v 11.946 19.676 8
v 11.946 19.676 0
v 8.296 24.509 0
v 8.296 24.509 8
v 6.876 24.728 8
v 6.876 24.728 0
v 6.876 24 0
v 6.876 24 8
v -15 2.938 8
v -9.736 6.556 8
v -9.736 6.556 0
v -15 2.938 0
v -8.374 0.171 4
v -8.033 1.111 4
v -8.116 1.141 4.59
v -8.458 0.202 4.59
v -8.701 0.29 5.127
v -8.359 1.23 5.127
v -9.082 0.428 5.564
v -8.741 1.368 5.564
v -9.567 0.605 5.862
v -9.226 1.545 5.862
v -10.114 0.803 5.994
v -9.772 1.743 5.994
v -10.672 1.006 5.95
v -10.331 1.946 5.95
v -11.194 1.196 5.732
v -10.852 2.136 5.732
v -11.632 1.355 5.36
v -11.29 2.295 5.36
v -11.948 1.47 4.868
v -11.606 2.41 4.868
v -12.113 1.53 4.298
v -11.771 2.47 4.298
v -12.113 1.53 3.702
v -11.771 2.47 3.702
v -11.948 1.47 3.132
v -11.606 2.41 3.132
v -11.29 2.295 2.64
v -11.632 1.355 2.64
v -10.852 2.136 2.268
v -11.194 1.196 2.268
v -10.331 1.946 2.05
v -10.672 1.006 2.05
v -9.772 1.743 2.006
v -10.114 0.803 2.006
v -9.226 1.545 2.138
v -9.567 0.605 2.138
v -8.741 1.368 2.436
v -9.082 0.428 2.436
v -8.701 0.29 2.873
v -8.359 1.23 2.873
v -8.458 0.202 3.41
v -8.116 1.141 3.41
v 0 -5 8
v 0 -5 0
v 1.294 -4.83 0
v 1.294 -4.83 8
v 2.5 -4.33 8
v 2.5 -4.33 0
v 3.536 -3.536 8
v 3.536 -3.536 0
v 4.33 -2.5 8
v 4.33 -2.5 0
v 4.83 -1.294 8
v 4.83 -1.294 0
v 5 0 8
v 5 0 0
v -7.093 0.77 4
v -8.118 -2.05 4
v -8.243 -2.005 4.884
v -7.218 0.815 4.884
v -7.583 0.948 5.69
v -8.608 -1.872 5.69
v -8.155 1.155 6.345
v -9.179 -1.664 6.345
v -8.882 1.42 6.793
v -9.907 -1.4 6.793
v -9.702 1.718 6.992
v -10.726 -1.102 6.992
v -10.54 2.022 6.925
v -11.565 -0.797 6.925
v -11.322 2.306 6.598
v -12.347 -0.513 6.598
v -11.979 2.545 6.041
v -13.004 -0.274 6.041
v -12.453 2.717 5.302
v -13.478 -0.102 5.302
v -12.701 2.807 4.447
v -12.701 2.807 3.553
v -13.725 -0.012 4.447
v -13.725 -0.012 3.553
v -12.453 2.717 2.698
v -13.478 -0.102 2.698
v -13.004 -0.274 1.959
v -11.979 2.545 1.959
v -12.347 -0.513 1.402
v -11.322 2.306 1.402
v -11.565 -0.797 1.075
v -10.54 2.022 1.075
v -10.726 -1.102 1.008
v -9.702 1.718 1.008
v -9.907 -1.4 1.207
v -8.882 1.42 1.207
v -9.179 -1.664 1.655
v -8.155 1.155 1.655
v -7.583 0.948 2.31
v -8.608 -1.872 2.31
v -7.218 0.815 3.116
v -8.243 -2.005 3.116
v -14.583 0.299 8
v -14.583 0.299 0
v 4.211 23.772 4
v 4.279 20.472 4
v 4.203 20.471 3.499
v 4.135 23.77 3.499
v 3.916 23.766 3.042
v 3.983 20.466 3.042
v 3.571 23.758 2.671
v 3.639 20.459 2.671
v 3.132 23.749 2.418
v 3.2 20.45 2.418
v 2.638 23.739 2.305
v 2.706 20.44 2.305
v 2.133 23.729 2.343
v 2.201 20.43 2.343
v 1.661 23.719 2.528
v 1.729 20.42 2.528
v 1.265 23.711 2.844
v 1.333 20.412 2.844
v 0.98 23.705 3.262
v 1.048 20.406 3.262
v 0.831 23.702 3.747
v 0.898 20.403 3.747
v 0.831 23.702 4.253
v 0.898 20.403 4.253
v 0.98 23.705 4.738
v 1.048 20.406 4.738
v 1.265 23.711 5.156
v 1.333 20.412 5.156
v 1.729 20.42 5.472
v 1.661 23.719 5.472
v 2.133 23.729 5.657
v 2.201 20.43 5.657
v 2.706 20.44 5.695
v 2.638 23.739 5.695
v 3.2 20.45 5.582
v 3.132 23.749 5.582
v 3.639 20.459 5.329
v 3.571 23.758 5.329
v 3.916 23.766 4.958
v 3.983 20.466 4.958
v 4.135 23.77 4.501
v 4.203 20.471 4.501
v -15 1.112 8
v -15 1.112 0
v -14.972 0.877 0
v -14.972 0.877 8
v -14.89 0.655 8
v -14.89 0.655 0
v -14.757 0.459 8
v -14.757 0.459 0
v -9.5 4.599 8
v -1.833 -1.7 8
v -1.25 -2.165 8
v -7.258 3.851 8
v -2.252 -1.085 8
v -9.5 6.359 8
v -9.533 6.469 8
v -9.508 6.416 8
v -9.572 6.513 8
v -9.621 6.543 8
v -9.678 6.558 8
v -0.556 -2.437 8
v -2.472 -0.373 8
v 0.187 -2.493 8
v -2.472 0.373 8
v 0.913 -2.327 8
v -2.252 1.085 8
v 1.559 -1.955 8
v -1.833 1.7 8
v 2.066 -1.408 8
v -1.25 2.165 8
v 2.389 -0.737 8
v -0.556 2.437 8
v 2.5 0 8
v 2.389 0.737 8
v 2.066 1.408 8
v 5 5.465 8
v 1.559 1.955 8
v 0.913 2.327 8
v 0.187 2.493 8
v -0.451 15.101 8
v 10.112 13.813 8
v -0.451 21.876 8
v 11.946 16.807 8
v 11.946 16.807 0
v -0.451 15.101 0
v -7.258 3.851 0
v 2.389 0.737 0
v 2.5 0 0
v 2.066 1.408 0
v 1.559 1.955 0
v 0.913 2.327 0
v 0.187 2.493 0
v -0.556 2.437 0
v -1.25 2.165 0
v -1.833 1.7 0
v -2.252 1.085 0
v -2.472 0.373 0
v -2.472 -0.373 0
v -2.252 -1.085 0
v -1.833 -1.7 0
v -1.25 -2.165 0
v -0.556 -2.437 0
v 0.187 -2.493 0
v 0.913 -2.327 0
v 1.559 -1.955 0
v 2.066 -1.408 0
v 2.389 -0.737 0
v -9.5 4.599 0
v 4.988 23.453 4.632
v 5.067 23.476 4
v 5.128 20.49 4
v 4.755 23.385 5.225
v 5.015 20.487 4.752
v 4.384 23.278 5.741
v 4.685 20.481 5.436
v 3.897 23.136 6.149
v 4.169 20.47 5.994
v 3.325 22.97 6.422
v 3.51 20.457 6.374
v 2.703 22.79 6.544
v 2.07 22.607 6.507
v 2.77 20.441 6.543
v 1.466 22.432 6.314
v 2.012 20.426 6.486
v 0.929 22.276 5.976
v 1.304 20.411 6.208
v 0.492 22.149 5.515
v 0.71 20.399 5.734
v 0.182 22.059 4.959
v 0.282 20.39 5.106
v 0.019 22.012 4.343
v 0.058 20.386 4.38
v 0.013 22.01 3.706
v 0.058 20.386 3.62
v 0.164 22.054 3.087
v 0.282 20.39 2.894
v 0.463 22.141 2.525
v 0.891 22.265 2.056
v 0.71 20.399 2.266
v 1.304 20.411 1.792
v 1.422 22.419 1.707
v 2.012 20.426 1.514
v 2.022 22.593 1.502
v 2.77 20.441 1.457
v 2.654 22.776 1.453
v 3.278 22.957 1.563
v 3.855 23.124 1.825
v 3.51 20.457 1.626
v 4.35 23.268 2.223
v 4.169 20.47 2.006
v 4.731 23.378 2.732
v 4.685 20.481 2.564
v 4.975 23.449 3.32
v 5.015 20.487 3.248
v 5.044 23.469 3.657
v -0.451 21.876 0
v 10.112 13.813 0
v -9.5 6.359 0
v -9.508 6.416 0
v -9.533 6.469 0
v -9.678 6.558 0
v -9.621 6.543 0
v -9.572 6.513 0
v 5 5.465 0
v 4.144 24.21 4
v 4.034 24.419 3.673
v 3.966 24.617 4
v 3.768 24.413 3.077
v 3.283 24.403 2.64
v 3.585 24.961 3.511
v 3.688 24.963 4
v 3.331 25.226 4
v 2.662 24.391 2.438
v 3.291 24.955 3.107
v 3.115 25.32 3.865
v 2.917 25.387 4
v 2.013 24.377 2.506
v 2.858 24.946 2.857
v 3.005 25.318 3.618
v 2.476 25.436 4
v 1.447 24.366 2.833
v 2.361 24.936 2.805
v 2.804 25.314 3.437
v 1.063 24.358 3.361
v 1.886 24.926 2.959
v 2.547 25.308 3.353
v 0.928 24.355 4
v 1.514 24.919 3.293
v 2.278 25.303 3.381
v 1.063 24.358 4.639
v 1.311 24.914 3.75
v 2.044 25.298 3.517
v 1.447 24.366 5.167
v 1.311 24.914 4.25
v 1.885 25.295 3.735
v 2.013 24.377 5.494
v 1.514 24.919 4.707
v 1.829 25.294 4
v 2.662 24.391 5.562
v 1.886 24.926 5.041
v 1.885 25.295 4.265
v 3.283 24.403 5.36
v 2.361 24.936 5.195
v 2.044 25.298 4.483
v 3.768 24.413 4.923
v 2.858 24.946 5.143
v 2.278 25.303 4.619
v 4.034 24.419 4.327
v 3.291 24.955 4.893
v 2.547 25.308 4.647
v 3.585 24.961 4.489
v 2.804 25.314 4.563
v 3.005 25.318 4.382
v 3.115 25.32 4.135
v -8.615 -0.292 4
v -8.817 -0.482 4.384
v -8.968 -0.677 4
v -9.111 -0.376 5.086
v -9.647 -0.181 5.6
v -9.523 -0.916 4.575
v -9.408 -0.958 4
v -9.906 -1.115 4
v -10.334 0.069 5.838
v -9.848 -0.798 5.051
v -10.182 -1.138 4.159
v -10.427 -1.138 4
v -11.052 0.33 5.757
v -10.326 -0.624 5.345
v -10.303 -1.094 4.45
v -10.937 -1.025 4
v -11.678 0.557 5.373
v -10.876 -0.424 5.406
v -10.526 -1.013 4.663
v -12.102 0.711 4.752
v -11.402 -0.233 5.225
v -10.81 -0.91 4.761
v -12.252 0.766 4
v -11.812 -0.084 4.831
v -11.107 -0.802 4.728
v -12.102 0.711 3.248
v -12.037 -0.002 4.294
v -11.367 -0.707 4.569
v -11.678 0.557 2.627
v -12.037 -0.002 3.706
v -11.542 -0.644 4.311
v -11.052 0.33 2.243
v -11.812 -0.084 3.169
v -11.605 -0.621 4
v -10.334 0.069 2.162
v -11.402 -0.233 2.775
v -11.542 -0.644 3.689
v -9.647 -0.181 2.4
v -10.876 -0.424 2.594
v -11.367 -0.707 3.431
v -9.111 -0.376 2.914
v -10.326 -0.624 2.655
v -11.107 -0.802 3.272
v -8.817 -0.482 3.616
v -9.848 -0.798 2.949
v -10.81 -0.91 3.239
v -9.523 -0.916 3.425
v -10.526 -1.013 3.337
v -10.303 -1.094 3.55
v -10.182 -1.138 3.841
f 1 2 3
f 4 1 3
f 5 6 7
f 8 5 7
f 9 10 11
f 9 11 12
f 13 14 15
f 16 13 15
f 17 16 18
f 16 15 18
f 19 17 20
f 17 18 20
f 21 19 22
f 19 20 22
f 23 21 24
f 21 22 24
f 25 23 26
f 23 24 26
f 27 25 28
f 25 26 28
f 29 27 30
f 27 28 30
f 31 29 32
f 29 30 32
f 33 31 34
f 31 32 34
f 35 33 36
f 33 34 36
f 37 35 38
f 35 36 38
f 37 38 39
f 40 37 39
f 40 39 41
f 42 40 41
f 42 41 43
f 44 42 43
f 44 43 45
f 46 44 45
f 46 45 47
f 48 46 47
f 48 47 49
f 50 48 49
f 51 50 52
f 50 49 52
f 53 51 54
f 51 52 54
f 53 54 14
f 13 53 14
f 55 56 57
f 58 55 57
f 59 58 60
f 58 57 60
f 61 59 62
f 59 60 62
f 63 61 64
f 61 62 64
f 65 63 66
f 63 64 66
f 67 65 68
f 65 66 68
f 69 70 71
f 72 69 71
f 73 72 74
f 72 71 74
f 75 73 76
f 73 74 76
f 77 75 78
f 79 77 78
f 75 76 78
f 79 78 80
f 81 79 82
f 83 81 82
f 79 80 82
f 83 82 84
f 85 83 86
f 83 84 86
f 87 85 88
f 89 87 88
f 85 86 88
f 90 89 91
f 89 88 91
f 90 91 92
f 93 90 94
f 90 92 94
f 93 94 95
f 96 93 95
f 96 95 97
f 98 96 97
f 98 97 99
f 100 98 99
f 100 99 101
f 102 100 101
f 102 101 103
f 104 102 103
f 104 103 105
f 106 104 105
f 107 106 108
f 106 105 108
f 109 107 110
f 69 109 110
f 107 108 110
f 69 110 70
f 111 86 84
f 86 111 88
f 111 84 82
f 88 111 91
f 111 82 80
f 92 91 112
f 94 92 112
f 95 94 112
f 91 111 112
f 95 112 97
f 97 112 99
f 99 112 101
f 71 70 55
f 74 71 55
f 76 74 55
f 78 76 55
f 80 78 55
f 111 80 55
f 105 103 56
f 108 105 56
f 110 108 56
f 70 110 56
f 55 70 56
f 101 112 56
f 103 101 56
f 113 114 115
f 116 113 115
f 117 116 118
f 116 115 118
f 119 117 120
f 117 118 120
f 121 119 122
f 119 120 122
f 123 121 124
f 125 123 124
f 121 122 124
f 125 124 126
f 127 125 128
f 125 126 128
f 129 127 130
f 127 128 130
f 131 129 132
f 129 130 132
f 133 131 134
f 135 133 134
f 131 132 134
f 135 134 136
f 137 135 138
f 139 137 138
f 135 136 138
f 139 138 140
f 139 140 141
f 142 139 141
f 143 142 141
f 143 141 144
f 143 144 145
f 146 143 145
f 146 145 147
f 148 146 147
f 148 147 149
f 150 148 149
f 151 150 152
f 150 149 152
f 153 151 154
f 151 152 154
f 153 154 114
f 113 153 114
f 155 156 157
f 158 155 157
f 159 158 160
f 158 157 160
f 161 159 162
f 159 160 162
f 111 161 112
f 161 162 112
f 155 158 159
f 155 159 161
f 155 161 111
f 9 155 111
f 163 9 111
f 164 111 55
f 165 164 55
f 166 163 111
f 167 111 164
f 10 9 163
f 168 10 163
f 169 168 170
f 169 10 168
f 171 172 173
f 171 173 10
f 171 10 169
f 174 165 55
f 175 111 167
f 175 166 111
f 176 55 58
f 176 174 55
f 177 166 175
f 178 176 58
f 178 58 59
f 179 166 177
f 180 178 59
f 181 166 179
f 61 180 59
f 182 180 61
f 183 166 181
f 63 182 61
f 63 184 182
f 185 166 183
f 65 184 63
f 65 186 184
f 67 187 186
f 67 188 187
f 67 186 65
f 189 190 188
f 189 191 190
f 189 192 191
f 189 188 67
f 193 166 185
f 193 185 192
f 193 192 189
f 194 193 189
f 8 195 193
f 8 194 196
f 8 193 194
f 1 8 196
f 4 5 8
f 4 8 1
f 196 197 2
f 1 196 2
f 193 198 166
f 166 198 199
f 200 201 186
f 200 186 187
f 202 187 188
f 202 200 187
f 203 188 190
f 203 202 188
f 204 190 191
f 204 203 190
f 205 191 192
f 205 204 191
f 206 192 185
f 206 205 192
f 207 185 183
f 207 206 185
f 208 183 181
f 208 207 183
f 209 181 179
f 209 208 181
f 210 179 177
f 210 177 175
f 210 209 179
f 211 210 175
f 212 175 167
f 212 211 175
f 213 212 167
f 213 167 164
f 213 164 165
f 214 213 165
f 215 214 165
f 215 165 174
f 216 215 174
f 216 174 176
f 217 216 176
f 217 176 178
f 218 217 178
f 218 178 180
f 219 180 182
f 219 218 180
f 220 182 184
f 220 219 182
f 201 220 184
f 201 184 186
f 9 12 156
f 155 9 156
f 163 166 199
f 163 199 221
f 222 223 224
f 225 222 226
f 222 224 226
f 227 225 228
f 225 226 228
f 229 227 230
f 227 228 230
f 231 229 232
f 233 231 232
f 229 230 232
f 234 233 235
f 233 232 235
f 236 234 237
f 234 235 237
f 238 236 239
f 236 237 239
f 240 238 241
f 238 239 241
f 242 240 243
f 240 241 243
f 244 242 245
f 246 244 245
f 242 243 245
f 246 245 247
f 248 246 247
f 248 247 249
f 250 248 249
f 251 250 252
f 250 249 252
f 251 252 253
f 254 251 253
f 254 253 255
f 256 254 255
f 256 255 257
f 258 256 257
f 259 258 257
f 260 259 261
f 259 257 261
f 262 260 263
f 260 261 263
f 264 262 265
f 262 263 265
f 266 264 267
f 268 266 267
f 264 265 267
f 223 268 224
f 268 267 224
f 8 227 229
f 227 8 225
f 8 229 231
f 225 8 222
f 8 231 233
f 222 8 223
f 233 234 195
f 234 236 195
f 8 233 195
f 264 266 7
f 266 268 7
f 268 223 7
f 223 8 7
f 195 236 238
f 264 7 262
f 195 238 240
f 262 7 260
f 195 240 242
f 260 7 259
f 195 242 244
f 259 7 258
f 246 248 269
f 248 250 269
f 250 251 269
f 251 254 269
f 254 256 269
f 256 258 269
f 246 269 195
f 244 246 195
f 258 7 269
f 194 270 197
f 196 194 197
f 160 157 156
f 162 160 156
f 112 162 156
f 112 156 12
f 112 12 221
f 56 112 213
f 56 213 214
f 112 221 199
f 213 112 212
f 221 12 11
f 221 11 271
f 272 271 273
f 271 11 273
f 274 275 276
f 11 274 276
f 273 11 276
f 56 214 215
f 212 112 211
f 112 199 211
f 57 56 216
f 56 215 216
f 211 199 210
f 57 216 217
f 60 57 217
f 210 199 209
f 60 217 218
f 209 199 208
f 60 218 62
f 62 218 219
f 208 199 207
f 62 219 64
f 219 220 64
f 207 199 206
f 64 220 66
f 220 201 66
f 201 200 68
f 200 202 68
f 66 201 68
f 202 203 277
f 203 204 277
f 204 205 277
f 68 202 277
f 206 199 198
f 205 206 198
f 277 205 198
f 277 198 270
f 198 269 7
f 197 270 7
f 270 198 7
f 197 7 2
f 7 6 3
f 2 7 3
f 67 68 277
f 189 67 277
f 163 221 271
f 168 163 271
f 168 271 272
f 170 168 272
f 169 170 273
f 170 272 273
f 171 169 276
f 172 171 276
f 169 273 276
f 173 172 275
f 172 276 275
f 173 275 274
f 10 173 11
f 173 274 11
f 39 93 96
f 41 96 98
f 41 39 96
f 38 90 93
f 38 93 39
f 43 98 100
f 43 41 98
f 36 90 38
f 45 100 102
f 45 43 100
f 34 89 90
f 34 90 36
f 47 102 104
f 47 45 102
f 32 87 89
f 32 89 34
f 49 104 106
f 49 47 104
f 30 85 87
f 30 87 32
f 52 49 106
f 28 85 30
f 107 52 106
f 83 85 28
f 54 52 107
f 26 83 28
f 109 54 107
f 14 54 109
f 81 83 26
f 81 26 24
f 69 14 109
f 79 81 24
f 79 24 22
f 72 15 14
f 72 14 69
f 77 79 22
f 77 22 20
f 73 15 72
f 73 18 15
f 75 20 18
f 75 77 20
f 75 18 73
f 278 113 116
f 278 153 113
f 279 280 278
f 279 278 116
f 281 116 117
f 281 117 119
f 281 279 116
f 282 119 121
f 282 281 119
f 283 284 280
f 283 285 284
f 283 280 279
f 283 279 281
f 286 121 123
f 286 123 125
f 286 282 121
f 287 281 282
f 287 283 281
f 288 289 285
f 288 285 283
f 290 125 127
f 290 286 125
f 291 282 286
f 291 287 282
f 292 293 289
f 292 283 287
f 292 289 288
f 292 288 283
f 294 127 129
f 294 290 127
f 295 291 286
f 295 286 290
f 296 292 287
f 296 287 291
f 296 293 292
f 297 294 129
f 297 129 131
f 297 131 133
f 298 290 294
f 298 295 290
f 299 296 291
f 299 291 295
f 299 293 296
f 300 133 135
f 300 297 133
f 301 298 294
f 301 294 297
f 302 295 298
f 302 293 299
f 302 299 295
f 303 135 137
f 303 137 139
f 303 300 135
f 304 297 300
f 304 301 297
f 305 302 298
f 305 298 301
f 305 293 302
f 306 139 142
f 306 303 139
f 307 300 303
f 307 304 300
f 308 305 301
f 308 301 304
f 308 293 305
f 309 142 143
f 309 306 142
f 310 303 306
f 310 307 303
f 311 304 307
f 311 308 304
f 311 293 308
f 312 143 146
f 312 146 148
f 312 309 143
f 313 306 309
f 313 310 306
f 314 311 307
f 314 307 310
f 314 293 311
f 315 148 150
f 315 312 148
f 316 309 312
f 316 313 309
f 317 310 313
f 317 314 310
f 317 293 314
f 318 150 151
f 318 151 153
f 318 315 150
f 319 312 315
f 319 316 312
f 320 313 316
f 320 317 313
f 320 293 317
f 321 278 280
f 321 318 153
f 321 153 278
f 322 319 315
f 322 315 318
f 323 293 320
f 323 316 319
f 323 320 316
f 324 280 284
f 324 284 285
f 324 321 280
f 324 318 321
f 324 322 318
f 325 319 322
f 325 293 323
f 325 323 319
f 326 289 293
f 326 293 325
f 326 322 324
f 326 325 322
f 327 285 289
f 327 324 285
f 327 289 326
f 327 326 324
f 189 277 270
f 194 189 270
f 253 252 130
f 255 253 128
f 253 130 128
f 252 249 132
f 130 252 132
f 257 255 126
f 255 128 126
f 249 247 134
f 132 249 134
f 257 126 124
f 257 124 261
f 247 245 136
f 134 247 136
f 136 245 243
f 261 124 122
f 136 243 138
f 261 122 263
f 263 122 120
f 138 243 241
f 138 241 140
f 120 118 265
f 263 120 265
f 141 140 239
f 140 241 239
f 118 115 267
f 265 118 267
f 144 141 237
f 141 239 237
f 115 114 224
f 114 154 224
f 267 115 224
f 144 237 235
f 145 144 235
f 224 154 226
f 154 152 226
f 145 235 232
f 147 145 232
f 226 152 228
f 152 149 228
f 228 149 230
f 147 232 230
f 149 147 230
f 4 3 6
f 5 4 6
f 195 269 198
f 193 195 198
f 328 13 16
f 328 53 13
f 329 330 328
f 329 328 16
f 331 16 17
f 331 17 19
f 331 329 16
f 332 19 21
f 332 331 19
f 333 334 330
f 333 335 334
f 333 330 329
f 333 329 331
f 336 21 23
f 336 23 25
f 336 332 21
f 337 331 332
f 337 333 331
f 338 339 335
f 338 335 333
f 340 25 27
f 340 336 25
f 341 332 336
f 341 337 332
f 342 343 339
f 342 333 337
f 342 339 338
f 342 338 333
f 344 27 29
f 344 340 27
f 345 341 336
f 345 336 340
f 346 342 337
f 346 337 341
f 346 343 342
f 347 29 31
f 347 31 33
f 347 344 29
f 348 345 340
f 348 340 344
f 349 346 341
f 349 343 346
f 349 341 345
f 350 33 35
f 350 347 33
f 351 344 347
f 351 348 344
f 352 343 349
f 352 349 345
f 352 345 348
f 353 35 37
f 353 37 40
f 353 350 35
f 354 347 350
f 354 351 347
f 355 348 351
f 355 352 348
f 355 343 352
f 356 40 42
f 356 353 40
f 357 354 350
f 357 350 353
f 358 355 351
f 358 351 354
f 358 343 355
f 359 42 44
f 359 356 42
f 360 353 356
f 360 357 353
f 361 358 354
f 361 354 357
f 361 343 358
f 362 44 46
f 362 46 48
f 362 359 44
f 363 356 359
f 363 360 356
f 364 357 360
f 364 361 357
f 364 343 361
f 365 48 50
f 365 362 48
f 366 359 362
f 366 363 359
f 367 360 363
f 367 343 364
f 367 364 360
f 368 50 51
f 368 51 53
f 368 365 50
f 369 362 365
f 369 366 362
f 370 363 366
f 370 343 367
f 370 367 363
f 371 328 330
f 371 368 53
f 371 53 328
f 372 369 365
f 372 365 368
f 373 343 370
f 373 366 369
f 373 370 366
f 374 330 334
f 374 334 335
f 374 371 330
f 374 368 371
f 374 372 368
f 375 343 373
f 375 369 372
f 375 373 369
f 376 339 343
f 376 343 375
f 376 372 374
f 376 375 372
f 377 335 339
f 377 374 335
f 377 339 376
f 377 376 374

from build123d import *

# Parameters (mm, degrees)
SKETCH_1_R          = 2.5
EXTRUDE_1_DEPTH     = 8
SKETCH_5_R          = 3
CUT_EXTRUDE_2_DEPTH = 3
SKETCH_7_R          = 2
EXTRUDE_3_DEPTH     = 3
FILLET_5_R          = 2
SKETCH_9_R          = 2.55
CUT_EXTRUDE_3_DEPTH = 1.5
SKETCH_10_R         = 1.7
EXTRUDE_4_DEPTH     = 5
FILLET_6_R          = 1.7


with BuildPart() as part:
    # 스케치1 → 보스-돌출1 (new body)
    with BuildSketch(Plane.XY):
        with BuildLine():
            Line((6.875581969, 24), (-0.451148657, 21.875531488))
            Line((-0.451148657, 21.875531488), (-0.451148657, 15.101495802))
            Line((-0.451148657, 15.101495802), (-7.258120431, 3.851310171))
            Line((-7.258120431, 3.851310171), (-9.5, 4.598603361))
            Line((-9.5, 4.598603361), (-9.5, 6.358960817))
            ThreePointArc((-9.5, 6.358960817), (-9.571850512, 6.512511163), (-9.735777088, 6.555734799))
            Line((-9.735777088, 6.555734799), (-15, 2.937976957))
            Line((-15, 2.937976957), (-15, 1.111926907))
            ThreePointArc((-15, 1.111926907), (-14.889635684, 0.655255963), (-14.582903299, 0.299385373))
            Line((-14.582903299, 0.299385373), (0, -5))
            ThreePointArc((0, -5), (3.535533906, -3.535533906), (5, 0))
            Line((5, 0), (5, 3.83484861))
            Line((5, 3.83484861), (5, 5.464934457))
            Line((5, 5.464934457), (10.112329073, 13.81338505))
            Line((10.112329073, 13.81338505), (11.945796901, 16.807444187))
            Line((11.945796901, 16.807444187), (11.945796901, 19.676308628))
            Line((11.945796901, 19.676308628), (8.295575886, 24.508809453))
            Line((8.295575886, 24.508809453), (6.875581969, 24.728164545))
            Line((6.875581969, 24.728164545), (6.875581969, 24))
        make_face()
        Circle(SKETCH_1_R, mode=Mode.SUBTRACT)
    extrude(amount=EXTRUDE_1_DEPTH)

    # 스케치5 → 컷-돌출2 (cut)
    with BuildSketch(Plane(origin=(-1.605029546, -4.416736851, 0), x_dir=(0.9398656128397294, -0.34154447704713375, 0), z_dir=(-0.34154447704713375, -0.9398656128397295, 0))):
        with Locations((-9.929236479, 4)):
            Circle(SKETCH_5_R)
    extrude(amount=-CUT_EXTRUDE_2_DEPTH, mode=Mode.SUBTRACT)

    # 스케치7 → 보스-돌출3 (add)
    with BuildSketch(Plane(origin=(-0.580396115, -1.597140012, 0), x_dir=(0.9398656128397294, -0.34154447704713387, 0), z_dir=(-0.34154447704713387, -0.9398656128397294, 0))):
        with Locations((-9.929236479, 4)):
            Circle(SKETCH_7_R)
    extrude(amount=EXTRUDE_3_DEPTH)

    # 필렛5
    fillet_5_edges = [part.edges().sort_by_distance(p)[0] for p in [
        (-12.8169087, -0.342372016, 4),
    ]]
    fillet(fillet_5_edges, radius=FILLET_5_R)

    # 스케치9 → 컷-돌출3 (cut, symmetric)
    with BuildSketch(Plane(origin=(-0.449080246, 21.87557395, 0), x_dir=(-0.9997893498603082, -0.02052451962658901, 0), z_dir=(0.02052451962658901, -0.9997893498603082, 0))):
        with Locations(Location((-2.997931152, -4, 0), (0, 0, 180))):
            Circle(SKETCH_9_R)
    extrude(amount=CUT_EXTRUDE_3_DEPTH, both=True, mode=Mode.SUBTRACT)

    # 스케치10 → 보스-돌출4 (add)
    with BuildSketch(Plane(origin=(-0.418293466, 20.375889925, 0), x_dir=(0.9997893498603082, 0.020524519626589015, 0), z_dir=(-0.020524519626589015, 0.9997893498603082, 0))):
        with Locations((2.997931152, -4)):
            Circle(SKETCH_10_R)
    extrude(amount=EXTRUDE_4_DEPTH)

    # 필렛6
    fillet_6_edges = [part.edges().sort_by_distance(p)[0] for p in [
        (0.776741679, 25.401476088, 4),
    ]]
    fillet(fillet_6_edges, radius=FILLET_6_R)


solid = part.part
